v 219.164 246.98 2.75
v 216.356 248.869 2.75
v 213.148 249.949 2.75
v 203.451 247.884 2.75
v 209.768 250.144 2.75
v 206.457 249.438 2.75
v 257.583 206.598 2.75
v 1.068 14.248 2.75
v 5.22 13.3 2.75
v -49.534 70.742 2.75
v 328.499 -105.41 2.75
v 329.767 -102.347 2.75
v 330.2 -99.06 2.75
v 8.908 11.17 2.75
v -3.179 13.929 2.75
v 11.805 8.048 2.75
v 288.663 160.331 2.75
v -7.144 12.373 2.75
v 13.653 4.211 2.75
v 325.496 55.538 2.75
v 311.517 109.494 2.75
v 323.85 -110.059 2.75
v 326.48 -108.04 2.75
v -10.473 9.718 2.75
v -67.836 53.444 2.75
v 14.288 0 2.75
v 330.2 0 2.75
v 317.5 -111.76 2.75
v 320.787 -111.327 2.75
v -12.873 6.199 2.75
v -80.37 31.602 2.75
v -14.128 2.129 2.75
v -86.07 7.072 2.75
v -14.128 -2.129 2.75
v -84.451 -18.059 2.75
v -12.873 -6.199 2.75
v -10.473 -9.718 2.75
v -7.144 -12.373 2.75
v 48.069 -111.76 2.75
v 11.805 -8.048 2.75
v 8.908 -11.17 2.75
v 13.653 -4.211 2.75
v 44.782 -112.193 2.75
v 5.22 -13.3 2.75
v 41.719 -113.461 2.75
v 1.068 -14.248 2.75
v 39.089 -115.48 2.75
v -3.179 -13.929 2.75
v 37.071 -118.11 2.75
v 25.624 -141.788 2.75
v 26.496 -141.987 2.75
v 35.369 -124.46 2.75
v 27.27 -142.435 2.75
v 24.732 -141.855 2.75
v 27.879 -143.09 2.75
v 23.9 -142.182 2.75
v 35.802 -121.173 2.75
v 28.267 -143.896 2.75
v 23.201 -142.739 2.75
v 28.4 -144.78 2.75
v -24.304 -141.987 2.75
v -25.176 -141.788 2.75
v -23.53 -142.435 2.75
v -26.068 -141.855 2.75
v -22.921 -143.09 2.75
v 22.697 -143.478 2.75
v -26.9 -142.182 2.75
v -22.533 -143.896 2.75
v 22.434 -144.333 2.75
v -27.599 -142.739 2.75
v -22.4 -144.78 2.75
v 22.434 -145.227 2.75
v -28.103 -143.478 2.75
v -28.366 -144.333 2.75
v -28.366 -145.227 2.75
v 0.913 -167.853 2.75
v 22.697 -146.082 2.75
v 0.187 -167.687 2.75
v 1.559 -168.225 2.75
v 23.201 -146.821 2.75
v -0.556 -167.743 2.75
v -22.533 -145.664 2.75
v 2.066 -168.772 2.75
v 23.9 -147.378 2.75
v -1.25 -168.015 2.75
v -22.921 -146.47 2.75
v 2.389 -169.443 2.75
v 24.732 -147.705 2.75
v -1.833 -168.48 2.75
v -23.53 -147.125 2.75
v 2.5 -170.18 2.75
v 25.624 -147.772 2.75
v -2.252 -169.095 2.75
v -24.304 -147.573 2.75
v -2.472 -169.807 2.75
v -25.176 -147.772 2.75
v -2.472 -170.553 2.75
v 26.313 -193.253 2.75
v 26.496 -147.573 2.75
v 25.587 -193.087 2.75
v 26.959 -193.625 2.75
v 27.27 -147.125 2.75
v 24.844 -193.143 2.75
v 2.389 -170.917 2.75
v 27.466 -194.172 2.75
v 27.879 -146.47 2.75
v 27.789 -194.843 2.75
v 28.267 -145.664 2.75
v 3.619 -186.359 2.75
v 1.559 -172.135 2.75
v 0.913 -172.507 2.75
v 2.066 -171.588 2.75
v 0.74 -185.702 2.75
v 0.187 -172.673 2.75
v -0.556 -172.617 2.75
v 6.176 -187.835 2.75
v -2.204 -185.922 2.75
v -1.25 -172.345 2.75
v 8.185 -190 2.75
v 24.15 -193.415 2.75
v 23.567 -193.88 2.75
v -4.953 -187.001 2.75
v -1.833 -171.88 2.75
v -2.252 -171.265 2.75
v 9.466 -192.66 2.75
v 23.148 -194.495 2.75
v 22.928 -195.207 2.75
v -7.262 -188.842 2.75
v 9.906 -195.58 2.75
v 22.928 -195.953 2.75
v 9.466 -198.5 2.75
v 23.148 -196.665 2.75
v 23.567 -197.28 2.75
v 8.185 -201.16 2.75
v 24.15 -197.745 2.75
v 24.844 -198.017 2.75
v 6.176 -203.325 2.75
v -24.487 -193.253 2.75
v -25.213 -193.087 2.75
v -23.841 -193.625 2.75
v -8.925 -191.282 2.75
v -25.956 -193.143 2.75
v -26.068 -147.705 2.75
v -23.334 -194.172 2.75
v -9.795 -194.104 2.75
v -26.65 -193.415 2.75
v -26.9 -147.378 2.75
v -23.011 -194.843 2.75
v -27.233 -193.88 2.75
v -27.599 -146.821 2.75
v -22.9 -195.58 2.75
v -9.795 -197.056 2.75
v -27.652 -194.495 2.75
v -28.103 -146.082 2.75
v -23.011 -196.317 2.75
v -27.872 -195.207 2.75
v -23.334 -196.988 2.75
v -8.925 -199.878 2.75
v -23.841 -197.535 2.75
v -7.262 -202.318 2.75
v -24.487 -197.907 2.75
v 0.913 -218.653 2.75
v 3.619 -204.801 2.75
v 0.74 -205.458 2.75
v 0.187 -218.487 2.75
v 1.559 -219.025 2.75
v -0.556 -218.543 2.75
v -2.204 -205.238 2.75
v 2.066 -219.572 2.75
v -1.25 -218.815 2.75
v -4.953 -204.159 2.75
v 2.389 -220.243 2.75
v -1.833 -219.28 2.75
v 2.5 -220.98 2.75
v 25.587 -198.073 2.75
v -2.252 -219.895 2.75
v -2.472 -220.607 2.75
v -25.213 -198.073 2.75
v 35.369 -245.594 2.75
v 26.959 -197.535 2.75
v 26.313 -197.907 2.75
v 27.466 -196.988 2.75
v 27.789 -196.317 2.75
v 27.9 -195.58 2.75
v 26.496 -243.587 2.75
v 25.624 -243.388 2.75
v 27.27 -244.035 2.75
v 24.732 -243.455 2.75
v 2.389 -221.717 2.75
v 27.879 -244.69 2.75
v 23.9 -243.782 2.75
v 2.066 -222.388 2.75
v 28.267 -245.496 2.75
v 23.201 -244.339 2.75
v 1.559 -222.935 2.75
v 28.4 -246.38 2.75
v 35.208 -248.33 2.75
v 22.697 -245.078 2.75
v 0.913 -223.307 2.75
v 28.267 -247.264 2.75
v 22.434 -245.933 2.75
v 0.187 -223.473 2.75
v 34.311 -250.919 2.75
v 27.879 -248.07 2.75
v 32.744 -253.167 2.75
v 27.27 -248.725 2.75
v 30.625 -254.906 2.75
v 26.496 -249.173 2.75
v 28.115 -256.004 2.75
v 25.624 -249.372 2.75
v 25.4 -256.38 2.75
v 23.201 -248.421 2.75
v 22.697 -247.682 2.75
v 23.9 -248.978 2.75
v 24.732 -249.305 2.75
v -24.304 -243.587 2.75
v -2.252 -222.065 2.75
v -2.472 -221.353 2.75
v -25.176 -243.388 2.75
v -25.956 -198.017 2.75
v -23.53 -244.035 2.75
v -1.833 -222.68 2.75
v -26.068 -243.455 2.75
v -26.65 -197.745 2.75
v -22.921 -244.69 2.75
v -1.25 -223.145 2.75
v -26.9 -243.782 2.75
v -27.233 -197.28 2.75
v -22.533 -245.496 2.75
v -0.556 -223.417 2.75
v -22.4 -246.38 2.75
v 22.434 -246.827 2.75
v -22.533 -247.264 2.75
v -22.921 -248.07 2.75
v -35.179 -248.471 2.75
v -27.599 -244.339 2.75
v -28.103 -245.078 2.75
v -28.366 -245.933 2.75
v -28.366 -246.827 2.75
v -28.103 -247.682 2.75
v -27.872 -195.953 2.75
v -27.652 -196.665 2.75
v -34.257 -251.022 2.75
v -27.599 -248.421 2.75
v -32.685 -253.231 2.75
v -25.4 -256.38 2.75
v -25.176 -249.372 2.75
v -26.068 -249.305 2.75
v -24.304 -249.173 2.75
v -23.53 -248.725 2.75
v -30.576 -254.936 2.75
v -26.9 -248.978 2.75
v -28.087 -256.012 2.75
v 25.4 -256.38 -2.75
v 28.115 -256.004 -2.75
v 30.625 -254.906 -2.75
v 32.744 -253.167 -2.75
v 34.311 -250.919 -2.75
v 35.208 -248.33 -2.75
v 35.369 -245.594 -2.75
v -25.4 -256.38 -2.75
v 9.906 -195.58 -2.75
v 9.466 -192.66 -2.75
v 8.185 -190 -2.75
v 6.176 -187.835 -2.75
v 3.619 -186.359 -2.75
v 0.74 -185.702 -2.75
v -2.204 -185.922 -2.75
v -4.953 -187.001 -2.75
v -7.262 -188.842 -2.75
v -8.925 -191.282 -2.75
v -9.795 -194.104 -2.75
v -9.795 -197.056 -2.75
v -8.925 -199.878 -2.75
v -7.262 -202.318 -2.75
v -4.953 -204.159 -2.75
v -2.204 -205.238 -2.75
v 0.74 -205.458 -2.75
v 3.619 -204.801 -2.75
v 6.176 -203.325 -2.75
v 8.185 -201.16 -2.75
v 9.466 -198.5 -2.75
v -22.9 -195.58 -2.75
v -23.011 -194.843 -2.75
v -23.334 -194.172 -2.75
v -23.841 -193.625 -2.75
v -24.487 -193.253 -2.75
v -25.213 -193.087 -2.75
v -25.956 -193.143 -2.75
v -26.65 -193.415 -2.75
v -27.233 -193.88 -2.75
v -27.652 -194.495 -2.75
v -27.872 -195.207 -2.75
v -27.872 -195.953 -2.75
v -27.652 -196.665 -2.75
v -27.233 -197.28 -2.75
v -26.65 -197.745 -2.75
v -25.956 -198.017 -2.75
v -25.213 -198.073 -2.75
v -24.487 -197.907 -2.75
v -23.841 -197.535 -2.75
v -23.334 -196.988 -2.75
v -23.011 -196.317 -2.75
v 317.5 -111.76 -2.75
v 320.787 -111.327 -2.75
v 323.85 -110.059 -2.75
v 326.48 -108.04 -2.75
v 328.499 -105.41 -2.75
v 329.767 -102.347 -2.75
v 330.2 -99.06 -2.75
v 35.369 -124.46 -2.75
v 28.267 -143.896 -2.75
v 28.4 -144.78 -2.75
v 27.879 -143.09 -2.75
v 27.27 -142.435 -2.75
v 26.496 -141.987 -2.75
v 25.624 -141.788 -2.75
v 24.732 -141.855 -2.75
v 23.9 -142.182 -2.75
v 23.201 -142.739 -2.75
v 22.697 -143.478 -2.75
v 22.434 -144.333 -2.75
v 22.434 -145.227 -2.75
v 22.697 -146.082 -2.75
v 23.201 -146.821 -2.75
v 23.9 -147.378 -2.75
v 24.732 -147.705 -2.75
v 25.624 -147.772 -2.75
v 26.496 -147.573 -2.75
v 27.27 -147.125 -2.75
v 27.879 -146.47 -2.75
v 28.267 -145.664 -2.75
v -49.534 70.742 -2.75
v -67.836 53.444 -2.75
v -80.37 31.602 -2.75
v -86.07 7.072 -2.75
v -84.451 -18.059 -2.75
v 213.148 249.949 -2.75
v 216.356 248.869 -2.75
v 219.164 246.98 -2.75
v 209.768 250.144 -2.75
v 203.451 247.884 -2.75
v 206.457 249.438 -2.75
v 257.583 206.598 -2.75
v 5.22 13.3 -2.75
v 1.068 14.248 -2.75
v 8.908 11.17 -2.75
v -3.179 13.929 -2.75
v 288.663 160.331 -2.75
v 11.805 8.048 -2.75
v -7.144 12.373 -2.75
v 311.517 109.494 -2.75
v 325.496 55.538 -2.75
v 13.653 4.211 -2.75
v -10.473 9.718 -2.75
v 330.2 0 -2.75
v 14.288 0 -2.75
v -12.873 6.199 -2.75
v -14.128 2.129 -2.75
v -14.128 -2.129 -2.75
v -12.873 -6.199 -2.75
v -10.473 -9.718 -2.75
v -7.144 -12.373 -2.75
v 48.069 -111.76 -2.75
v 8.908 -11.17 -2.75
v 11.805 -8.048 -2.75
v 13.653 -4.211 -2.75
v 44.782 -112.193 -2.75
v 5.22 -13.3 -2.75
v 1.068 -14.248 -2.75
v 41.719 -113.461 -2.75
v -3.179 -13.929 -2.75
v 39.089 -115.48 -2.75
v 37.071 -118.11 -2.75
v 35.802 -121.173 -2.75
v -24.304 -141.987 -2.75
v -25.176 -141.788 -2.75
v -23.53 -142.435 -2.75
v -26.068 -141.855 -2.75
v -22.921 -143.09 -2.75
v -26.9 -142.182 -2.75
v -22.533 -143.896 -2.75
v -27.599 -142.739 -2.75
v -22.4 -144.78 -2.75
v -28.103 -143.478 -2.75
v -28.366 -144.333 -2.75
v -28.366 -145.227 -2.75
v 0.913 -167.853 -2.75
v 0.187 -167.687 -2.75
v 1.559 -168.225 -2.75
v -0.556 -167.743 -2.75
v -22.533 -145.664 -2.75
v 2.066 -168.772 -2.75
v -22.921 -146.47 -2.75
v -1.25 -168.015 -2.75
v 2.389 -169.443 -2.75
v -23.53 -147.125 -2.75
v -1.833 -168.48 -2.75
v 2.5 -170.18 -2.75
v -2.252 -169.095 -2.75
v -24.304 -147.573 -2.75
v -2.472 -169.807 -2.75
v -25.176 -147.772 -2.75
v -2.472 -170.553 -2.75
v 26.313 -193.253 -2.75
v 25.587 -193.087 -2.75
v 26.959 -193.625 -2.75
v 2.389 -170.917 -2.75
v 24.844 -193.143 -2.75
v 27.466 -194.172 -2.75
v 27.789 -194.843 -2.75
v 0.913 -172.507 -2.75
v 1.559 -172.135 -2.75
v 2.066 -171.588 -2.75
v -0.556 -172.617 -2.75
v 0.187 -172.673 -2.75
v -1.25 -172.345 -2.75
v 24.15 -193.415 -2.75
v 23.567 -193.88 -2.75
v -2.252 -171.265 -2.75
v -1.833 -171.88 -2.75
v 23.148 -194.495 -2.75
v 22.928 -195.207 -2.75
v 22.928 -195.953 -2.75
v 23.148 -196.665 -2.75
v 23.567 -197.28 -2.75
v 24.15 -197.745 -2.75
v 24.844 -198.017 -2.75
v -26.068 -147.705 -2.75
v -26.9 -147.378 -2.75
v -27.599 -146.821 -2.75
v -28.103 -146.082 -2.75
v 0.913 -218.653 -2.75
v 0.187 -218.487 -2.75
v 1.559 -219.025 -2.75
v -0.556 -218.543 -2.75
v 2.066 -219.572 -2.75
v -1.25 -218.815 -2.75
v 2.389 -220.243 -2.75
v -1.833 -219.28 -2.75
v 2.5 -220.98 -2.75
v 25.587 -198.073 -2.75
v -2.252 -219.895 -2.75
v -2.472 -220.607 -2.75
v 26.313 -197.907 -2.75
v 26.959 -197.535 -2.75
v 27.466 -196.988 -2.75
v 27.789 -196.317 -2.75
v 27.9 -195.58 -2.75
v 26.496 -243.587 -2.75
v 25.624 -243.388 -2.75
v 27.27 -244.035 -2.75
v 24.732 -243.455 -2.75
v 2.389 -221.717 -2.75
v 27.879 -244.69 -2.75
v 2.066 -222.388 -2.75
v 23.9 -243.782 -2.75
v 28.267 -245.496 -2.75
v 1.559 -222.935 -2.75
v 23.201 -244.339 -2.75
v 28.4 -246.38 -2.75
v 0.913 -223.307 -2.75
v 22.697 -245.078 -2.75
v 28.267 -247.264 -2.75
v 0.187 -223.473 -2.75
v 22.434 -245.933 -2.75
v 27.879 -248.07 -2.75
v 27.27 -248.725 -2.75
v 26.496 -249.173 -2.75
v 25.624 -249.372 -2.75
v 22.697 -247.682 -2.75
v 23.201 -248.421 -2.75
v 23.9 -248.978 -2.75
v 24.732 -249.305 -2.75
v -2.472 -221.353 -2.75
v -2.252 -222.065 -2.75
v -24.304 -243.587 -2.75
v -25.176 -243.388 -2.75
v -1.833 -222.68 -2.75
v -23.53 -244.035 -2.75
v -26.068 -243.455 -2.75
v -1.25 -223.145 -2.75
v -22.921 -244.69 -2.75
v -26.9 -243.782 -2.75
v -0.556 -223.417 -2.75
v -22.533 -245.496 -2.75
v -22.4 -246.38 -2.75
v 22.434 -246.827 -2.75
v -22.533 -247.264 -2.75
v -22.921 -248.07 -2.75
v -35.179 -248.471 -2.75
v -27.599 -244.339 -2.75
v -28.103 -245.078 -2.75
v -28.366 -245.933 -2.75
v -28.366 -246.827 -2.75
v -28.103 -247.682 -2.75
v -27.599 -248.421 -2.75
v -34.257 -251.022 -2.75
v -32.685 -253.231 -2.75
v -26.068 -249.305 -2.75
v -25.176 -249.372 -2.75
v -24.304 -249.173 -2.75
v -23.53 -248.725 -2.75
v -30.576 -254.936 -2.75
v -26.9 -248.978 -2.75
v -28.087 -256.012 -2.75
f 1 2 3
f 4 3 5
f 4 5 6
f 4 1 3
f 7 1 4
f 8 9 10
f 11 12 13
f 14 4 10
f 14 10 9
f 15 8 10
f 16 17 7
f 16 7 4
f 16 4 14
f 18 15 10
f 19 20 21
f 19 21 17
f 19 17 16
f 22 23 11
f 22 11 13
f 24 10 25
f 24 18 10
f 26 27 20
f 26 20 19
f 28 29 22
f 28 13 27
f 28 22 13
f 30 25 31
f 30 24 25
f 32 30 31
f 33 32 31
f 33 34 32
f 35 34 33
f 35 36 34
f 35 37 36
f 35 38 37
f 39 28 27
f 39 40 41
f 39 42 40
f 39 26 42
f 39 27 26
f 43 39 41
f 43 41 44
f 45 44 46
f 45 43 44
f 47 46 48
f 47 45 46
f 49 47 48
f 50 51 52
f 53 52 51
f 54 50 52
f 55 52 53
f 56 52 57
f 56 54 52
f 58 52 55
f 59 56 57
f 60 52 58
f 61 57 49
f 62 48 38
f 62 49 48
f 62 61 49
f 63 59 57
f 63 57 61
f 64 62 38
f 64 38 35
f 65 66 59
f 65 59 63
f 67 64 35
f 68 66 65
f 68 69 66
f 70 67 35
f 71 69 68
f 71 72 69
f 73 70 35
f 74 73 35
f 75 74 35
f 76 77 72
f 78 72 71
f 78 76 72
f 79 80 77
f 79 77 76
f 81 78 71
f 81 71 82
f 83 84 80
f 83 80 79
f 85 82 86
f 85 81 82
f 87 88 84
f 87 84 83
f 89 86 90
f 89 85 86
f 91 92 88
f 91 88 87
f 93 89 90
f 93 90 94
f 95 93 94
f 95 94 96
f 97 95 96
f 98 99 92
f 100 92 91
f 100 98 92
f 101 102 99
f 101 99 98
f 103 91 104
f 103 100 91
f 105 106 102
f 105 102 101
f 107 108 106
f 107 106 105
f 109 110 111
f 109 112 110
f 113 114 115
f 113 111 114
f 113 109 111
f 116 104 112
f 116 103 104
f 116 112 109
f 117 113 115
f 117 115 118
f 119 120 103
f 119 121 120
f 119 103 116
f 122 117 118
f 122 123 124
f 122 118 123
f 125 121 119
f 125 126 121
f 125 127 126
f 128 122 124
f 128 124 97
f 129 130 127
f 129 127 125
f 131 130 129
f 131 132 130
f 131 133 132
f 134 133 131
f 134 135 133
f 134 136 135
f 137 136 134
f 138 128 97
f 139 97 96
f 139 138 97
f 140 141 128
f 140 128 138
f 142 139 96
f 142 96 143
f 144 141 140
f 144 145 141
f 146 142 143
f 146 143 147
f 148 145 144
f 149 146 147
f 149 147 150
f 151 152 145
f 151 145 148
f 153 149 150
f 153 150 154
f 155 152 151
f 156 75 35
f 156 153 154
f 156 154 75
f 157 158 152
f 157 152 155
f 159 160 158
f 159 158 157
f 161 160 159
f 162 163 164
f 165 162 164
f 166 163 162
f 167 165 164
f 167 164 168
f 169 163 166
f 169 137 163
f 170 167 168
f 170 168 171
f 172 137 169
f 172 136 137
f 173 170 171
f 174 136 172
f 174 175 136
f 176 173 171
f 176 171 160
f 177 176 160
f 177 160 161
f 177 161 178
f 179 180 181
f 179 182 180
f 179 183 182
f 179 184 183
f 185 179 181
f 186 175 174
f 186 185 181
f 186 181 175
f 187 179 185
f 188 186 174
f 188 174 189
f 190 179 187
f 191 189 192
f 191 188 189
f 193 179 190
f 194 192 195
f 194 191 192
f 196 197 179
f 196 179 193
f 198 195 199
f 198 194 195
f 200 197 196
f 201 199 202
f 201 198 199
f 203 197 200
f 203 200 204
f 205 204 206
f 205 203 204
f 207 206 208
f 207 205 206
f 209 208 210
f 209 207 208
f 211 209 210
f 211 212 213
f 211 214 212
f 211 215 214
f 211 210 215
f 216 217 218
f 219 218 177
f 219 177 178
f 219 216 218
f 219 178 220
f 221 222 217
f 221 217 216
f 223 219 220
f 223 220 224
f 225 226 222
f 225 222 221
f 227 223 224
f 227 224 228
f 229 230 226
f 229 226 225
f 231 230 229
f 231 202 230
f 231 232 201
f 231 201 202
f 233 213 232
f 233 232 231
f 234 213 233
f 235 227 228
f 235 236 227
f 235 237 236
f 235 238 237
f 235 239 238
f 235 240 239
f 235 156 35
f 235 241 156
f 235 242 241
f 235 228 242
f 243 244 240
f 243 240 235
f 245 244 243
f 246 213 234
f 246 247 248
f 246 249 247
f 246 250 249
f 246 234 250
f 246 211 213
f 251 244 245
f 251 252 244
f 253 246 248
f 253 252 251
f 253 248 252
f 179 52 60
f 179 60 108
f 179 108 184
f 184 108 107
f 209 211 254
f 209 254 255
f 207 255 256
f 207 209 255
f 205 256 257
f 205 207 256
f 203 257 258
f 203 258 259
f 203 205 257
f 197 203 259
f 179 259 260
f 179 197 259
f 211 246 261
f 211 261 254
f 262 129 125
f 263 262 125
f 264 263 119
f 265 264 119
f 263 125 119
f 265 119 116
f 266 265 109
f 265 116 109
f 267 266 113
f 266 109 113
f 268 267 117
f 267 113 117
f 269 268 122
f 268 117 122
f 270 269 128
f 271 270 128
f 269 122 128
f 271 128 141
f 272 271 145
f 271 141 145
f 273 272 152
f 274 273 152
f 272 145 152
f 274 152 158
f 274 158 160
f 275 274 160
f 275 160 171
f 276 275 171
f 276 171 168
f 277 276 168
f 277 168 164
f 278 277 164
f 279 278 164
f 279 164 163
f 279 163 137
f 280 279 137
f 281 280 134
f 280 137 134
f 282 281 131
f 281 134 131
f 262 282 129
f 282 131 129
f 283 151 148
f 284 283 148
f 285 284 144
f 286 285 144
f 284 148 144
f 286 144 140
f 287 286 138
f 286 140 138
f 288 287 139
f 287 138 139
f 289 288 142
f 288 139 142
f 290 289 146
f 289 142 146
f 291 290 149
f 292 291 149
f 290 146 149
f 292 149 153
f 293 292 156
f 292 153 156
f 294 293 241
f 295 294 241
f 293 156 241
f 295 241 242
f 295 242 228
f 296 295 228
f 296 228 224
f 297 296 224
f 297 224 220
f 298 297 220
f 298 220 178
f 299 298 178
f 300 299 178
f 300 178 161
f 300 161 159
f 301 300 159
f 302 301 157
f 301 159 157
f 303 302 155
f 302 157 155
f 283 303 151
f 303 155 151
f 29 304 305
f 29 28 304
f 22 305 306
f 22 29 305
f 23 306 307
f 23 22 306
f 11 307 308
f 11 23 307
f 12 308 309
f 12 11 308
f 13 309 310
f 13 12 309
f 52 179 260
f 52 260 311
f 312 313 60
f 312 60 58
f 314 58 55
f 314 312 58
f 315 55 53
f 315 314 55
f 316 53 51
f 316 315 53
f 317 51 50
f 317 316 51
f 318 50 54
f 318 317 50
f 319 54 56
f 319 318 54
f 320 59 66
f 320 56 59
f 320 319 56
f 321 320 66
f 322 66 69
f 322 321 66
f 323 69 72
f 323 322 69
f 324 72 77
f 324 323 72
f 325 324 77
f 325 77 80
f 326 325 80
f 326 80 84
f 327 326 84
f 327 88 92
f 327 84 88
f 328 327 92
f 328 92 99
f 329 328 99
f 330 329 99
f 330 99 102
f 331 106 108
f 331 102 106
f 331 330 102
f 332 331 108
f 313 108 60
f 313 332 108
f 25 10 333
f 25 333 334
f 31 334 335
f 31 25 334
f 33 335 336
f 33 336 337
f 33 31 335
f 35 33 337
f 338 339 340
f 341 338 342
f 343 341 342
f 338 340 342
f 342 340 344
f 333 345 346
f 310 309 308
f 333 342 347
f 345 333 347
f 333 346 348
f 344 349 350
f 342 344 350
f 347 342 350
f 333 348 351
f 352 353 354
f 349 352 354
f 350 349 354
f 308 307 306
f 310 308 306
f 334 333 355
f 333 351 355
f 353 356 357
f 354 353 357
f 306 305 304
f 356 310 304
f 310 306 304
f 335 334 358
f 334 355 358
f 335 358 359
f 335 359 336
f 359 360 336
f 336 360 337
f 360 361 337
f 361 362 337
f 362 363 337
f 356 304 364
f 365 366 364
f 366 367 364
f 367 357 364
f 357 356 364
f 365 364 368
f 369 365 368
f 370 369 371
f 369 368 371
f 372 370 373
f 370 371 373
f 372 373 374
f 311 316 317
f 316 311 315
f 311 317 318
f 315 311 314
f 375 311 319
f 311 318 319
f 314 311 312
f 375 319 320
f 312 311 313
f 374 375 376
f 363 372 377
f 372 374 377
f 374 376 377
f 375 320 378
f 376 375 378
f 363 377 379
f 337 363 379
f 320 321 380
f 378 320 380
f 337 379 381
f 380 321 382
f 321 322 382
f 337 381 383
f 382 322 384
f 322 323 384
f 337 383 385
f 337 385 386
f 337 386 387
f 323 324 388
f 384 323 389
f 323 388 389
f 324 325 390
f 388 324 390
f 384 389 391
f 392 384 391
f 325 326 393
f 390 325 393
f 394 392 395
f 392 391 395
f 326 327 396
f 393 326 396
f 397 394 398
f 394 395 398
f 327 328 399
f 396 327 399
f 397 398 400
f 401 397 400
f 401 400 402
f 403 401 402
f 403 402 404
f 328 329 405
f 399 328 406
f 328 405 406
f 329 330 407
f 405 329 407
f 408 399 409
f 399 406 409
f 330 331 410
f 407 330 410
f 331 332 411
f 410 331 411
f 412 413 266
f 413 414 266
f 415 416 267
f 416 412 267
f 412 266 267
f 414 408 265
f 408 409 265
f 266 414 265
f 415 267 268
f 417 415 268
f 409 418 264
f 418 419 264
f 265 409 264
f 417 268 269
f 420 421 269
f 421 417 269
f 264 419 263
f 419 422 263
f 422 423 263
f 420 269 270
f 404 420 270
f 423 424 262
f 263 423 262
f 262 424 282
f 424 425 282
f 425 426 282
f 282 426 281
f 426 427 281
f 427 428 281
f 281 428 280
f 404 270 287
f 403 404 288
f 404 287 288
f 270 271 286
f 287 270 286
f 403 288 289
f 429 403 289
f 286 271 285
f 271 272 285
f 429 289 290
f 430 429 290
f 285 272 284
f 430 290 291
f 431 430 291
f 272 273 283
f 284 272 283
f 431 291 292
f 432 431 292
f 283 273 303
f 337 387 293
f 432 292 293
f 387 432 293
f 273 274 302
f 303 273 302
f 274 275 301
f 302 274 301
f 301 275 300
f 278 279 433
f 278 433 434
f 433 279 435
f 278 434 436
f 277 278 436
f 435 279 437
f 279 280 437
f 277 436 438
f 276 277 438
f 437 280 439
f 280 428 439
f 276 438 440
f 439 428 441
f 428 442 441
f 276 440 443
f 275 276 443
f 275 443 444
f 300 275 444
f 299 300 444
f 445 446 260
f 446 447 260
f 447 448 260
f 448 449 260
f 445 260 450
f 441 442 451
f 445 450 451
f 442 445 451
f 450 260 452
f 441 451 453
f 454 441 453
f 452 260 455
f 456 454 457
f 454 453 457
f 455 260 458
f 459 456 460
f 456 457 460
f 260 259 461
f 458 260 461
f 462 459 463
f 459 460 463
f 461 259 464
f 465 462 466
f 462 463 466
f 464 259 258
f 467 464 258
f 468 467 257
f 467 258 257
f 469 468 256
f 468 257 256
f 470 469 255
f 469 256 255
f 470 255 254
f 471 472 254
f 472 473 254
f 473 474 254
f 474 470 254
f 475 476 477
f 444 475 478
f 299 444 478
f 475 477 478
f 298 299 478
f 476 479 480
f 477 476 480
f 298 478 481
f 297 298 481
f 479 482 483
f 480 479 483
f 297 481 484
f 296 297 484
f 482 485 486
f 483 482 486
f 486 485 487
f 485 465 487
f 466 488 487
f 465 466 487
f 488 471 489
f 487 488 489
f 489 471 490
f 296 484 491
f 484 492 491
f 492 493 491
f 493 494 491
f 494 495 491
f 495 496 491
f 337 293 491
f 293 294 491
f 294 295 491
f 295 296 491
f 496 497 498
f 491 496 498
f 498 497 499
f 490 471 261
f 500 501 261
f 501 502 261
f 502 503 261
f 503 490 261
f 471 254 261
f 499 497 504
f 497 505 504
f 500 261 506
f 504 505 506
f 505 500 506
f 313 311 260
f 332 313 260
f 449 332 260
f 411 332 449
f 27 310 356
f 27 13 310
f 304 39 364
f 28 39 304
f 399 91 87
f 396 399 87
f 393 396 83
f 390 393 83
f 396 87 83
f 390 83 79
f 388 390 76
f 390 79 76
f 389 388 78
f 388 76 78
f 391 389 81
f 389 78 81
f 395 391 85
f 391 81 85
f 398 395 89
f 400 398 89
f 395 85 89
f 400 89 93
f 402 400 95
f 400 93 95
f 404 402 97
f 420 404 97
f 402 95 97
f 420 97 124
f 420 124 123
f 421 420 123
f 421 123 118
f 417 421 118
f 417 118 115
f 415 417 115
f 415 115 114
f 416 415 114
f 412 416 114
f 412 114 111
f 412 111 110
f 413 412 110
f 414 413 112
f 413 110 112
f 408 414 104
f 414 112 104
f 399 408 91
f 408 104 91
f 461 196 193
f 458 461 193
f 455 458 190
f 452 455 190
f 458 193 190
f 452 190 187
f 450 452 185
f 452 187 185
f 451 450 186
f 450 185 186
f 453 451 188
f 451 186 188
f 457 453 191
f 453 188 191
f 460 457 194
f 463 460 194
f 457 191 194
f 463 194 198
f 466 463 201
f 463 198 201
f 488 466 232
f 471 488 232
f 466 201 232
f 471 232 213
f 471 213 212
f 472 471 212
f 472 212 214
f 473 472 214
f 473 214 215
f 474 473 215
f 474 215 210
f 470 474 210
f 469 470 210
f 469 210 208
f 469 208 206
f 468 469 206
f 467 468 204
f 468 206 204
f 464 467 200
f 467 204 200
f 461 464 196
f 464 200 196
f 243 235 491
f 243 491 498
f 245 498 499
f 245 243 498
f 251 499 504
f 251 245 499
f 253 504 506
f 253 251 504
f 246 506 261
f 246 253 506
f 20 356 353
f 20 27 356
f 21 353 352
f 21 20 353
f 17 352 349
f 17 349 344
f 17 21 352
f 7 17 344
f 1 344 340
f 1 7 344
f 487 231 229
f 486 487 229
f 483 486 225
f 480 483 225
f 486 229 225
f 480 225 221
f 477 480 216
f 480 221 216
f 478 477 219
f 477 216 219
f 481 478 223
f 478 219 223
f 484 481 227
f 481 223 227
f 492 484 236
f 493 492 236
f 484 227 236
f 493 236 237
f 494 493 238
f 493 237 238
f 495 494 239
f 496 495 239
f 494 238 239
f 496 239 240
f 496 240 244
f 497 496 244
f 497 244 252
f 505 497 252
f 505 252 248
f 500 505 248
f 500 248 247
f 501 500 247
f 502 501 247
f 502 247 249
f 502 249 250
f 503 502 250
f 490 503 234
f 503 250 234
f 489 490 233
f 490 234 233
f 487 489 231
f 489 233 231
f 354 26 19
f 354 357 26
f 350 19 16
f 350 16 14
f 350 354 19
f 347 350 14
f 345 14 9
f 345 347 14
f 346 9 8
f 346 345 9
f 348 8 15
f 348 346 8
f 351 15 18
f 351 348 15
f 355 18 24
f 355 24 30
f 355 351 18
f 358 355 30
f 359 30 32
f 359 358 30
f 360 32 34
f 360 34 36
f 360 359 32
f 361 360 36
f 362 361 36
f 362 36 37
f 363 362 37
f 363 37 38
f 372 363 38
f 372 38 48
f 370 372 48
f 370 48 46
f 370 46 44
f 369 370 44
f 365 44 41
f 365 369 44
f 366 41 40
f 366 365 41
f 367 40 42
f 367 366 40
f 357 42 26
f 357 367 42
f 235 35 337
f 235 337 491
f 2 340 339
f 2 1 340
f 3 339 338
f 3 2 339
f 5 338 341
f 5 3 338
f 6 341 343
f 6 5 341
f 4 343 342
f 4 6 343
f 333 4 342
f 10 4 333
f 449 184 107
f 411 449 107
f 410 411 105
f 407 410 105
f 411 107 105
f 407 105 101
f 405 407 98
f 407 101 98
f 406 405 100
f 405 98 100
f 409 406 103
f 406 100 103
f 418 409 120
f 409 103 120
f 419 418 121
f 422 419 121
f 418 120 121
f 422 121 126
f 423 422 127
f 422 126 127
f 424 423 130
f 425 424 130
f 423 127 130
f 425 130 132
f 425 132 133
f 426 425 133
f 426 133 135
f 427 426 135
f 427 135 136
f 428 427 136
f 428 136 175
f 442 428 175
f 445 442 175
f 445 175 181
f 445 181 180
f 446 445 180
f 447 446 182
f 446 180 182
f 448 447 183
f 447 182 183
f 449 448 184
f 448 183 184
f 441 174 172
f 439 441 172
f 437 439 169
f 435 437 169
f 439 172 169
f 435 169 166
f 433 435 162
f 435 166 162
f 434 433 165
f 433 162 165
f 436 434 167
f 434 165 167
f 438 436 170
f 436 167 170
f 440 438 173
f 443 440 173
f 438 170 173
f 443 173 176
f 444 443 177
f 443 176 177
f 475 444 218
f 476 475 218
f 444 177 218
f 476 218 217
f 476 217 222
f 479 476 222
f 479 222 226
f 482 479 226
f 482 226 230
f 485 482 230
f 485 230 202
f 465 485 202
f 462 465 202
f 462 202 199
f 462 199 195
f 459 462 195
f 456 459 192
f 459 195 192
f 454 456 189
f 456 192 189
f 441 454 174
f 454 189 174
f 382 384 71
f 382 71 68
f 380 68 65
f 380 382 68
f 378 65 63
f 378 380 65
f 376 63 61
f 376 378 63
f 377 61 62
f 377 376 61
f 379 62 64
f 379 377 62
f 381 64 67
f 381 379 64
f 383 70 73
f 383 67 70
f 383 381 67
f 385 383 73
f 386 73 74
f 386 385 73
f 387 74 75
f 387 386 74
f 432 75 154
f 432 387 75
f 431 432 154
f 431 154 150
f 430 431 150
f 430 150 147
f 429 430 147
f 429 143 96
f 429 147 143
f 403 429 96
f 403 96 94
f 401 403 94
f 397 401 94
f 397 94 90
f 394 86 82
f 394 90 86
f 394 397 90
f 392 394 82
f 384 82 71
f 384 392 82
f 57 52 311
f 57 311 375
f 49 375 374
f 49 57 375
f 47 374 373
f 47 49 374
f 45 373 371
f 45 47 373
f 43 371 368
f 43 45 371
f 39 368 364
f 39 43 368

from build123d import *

# Parameters (mm, degrees)
SKETCH1_R               = 86.36
SKETCH1_R_2             = 14.2875
BOSS_EXTRUDE1_DEPTH     = 2.75
SKETCH2_R               = 33.4
SKETCH2_R_2             = 9.906
SKETCH2_R_3             = 2.5
BOSS_EXTRUDE2_DEPTH     = 5.5
FILLET2_R               = 12.7
SKETCH4_R               = 3
BOSS_EXTRUDE3_DEPTH     = 5.5
CUT_EXTRUDE1_DEPTH      = 419.082521041
CUT_EXTRUDE1_DEPTH_BACK = 419.082521041
SKETCH4_3_R             = 3
FILLET3_R               = 12.7


with BuildPart() as part:
    # Sketch1 → Boss-Extrude1 (new, symmetric)
    # profile 1 of 3: a face of its own
    with BuildSketch(Plane.XY):
        Circle(SKETCH1_R)
        Circle(SKETCH1_R_2, mode=Mode.SUBTRACT)
    # profile 2 of 3: a face of its own
    with BuildSketch(Plane.XY):
        with BuildLine():
            Line((0, -86.36), (0, -111.76))
            Line((0, -111.76), (310.711670846, -111.76))
            ThreePointArc((310.711670846, -111.76), (325.291433728, -56.723215206), (330.2, 0))
            ThreePointArc((330.2, 0), (299.066021409, 139.96983546), (211.535222055, 253.544650565))
            Line((211.535222055, 253.544650565), (-49.534061043, 70.741970545))
            ThreePointArc((-49.534061043, 70.741970545), (39.876610239, 76.602255553), (86.36, 0))
            ThreePointArc((86.36, 0), (61.065741623, -61.065741623), (0, -86.36))
        make_face()
    # profile 3 of 3: a face of its own
    with BuildSketch(Plane.XY):
        with BuildLine():
            ThreePointArc((330.2, 0), (325.291433728, -56.723215206), (310.711670846, -111.76))
            Line((310.711670846, -111.76), (330.2, -111.76))
            Line((330.2, -111.76), (330.2, 0))
        make_face()
    extrude(amount=BOSS_EXTRUDE1_DEPTH, both=True)

    # Sketch2 → Boss-Extrude2 (add)
    # profile 1 of 2: a face of its own
    with BuildSketch(Plane.XY.offset(2.75)):
        with BuildLine():
            ThreePointArc((-32.152177301, -204.624196748), (-4.564935824, -162.493426274), (33.4, -195.58))
            Line((33.4, -195.58), (33.4, -111.76))
            Line((33.4, -111.76), (0, -111.76))
            Line((0, -111.76), (0, -86.36))
            ThreePointArc((0, -86.36), (-52.146556012, -68.838842931), (-83.133593763, -23.384935065))
            Line((-83.133593763, -23.384935065), (-32.152177301, -204.624196748))
        make_face()
    # profile 2 of 2: a face of its own
    with BuildSketch(Plane.XY.offset(2.75)):
        with Locations((0, -195.58)):
            Circle(SKETCH2_R)
        with Locations((0, -195.58)):
            Circle(SKETCH2_R_2, mode=Mode.SUBTRACT)
        with Locations((0, -170.18)):
            Circle(SKETCH2_R_3, mode=Mode.SUBTRACT)
        with Locations((25.4, -195.58)):
            Circle(SKETCH2_R_3, mode=Mode.SUBTRACT)
        with Locations((0, -220.98)):
            Circle(SKETCH2_R_3, mode=Mode.SUBTRACT)
        with Locations((-25.4, -195.58)):
            Circle(SKETCH2_R_3, mode=Mode.SUBTRACT)
    extrude(amount=-BOSS_EXTRUDE2_DEPTH)

    # Fillet2
    fillet2_edges = [part.edges().sort_by_distance(p)[0] for p in [
        (211.535222055, 253.544650565, 0),
        (330.2, -111.76, 0),
        (33.4, -111.76, 0),
    ]]
    fillet(fillet2_edges, radius=FILLET2_R)

    # Sketch4 → Boss-Extrude3 (add)
    with BuildSketch(Plane.XY.offset(2.75)):
        with BuildLine():
            ThreePointArc((-83.133593763, -23.384935065), (-83.834442875, -20.732481468), (-84.450685864, -18.05910455))
            Line((-84.450685864, -18.05910455), (-35.178912212, -248.471142259))
            ThreePointArc((-35.178912212, -248.471142259), (-31.688424978, -254.155327086), (-25.4, -256.38))
            Line((-25.4, -256.38), (25.4, -256.38))
            ThreePointArc((25.4, -256.38), (32.743767081, -253.16742109), (35.369047914, -245.593817011))
            Line((35.369047914, -245.593817011), (35.369047914, -117.66760224))
            ThreePointArc((35.369047914, -117.66760224), (33.902190945, -120.923977623), (33.4, -124.46))
            Line((33.4, -124.46), (33.4, -195.58))
            ThreePointArc((33.4, -195.58), (4.564935824, -228.666573726), (-32.152177301, -204.624196748))
            Line((-32.152177301, -204.624196748), (-83.133593763, -23.384935065))
        make_face()
        with Locations((-25.4, -246.38)):
            Circle(SKETCH4_R, mode=Mode.SUBTRACT)
        with Locations((25.4, -246.38)):
            Circle(SKETCH4_R, mode=Mode.SUBTRACT)
    extrude(amount=-BOSS_EXTRUDE3_DEPTH)

    # Sketch4<3> → Cut-Extrude1 (cut, two sides: drawn at the far end of the back side and taken through both)
    with BuildSketch(Plane.XY.offset(2.75).offset(-CUT_EXTRUDE1_DEPTH_BACK)):
        with Locations((-25.4, -144.78)):
            Circle(SKETCH4_3_R)
        with Locations((25.4, -144.78)):
            Circle(SKETCH4_3_R)
    extrude(amount=CUT_EXTRUDE1_DEPTH + CUT_EXTRUDE1_DEPTH_BACK, mode=Mode.SUBTRACT)

    # Fillet3
    # the kernel refuses this fillet: 12.7 mm, written as the material it adds along each edge
    with BuildSketch(Plane(origin=(35.369047914, -117.66760224, 2.75), x_dir=(0.9067040347764744, 0.4217674635626387, 0), z_dir=(0, 0, -1))) as fillet3_piece_1:
        with BuildLine():
            CenterArc((8.650328867, 11.515141242), FILLET3_R, 204.946225236, 90)
            Line((-2.864812375, 6.158694454), (-4.016326499, 5.623049776))
            Line((-4.016326499, 5.623049776), (-1.151514124, -0.535644679))
            Line((-1.151514124, -0.535644679), (-0.686498518, -1.06846609))
            ThreePointArc((-0.686498518, -1.06846609), (12.757076645, -1.981994468), (14.542420333, -1.151514124))
            Line((14.542420333, -1.151514124), (14.006775654, 0))
        make_face()
    extrude(amount=5.5)


solid = part.part
